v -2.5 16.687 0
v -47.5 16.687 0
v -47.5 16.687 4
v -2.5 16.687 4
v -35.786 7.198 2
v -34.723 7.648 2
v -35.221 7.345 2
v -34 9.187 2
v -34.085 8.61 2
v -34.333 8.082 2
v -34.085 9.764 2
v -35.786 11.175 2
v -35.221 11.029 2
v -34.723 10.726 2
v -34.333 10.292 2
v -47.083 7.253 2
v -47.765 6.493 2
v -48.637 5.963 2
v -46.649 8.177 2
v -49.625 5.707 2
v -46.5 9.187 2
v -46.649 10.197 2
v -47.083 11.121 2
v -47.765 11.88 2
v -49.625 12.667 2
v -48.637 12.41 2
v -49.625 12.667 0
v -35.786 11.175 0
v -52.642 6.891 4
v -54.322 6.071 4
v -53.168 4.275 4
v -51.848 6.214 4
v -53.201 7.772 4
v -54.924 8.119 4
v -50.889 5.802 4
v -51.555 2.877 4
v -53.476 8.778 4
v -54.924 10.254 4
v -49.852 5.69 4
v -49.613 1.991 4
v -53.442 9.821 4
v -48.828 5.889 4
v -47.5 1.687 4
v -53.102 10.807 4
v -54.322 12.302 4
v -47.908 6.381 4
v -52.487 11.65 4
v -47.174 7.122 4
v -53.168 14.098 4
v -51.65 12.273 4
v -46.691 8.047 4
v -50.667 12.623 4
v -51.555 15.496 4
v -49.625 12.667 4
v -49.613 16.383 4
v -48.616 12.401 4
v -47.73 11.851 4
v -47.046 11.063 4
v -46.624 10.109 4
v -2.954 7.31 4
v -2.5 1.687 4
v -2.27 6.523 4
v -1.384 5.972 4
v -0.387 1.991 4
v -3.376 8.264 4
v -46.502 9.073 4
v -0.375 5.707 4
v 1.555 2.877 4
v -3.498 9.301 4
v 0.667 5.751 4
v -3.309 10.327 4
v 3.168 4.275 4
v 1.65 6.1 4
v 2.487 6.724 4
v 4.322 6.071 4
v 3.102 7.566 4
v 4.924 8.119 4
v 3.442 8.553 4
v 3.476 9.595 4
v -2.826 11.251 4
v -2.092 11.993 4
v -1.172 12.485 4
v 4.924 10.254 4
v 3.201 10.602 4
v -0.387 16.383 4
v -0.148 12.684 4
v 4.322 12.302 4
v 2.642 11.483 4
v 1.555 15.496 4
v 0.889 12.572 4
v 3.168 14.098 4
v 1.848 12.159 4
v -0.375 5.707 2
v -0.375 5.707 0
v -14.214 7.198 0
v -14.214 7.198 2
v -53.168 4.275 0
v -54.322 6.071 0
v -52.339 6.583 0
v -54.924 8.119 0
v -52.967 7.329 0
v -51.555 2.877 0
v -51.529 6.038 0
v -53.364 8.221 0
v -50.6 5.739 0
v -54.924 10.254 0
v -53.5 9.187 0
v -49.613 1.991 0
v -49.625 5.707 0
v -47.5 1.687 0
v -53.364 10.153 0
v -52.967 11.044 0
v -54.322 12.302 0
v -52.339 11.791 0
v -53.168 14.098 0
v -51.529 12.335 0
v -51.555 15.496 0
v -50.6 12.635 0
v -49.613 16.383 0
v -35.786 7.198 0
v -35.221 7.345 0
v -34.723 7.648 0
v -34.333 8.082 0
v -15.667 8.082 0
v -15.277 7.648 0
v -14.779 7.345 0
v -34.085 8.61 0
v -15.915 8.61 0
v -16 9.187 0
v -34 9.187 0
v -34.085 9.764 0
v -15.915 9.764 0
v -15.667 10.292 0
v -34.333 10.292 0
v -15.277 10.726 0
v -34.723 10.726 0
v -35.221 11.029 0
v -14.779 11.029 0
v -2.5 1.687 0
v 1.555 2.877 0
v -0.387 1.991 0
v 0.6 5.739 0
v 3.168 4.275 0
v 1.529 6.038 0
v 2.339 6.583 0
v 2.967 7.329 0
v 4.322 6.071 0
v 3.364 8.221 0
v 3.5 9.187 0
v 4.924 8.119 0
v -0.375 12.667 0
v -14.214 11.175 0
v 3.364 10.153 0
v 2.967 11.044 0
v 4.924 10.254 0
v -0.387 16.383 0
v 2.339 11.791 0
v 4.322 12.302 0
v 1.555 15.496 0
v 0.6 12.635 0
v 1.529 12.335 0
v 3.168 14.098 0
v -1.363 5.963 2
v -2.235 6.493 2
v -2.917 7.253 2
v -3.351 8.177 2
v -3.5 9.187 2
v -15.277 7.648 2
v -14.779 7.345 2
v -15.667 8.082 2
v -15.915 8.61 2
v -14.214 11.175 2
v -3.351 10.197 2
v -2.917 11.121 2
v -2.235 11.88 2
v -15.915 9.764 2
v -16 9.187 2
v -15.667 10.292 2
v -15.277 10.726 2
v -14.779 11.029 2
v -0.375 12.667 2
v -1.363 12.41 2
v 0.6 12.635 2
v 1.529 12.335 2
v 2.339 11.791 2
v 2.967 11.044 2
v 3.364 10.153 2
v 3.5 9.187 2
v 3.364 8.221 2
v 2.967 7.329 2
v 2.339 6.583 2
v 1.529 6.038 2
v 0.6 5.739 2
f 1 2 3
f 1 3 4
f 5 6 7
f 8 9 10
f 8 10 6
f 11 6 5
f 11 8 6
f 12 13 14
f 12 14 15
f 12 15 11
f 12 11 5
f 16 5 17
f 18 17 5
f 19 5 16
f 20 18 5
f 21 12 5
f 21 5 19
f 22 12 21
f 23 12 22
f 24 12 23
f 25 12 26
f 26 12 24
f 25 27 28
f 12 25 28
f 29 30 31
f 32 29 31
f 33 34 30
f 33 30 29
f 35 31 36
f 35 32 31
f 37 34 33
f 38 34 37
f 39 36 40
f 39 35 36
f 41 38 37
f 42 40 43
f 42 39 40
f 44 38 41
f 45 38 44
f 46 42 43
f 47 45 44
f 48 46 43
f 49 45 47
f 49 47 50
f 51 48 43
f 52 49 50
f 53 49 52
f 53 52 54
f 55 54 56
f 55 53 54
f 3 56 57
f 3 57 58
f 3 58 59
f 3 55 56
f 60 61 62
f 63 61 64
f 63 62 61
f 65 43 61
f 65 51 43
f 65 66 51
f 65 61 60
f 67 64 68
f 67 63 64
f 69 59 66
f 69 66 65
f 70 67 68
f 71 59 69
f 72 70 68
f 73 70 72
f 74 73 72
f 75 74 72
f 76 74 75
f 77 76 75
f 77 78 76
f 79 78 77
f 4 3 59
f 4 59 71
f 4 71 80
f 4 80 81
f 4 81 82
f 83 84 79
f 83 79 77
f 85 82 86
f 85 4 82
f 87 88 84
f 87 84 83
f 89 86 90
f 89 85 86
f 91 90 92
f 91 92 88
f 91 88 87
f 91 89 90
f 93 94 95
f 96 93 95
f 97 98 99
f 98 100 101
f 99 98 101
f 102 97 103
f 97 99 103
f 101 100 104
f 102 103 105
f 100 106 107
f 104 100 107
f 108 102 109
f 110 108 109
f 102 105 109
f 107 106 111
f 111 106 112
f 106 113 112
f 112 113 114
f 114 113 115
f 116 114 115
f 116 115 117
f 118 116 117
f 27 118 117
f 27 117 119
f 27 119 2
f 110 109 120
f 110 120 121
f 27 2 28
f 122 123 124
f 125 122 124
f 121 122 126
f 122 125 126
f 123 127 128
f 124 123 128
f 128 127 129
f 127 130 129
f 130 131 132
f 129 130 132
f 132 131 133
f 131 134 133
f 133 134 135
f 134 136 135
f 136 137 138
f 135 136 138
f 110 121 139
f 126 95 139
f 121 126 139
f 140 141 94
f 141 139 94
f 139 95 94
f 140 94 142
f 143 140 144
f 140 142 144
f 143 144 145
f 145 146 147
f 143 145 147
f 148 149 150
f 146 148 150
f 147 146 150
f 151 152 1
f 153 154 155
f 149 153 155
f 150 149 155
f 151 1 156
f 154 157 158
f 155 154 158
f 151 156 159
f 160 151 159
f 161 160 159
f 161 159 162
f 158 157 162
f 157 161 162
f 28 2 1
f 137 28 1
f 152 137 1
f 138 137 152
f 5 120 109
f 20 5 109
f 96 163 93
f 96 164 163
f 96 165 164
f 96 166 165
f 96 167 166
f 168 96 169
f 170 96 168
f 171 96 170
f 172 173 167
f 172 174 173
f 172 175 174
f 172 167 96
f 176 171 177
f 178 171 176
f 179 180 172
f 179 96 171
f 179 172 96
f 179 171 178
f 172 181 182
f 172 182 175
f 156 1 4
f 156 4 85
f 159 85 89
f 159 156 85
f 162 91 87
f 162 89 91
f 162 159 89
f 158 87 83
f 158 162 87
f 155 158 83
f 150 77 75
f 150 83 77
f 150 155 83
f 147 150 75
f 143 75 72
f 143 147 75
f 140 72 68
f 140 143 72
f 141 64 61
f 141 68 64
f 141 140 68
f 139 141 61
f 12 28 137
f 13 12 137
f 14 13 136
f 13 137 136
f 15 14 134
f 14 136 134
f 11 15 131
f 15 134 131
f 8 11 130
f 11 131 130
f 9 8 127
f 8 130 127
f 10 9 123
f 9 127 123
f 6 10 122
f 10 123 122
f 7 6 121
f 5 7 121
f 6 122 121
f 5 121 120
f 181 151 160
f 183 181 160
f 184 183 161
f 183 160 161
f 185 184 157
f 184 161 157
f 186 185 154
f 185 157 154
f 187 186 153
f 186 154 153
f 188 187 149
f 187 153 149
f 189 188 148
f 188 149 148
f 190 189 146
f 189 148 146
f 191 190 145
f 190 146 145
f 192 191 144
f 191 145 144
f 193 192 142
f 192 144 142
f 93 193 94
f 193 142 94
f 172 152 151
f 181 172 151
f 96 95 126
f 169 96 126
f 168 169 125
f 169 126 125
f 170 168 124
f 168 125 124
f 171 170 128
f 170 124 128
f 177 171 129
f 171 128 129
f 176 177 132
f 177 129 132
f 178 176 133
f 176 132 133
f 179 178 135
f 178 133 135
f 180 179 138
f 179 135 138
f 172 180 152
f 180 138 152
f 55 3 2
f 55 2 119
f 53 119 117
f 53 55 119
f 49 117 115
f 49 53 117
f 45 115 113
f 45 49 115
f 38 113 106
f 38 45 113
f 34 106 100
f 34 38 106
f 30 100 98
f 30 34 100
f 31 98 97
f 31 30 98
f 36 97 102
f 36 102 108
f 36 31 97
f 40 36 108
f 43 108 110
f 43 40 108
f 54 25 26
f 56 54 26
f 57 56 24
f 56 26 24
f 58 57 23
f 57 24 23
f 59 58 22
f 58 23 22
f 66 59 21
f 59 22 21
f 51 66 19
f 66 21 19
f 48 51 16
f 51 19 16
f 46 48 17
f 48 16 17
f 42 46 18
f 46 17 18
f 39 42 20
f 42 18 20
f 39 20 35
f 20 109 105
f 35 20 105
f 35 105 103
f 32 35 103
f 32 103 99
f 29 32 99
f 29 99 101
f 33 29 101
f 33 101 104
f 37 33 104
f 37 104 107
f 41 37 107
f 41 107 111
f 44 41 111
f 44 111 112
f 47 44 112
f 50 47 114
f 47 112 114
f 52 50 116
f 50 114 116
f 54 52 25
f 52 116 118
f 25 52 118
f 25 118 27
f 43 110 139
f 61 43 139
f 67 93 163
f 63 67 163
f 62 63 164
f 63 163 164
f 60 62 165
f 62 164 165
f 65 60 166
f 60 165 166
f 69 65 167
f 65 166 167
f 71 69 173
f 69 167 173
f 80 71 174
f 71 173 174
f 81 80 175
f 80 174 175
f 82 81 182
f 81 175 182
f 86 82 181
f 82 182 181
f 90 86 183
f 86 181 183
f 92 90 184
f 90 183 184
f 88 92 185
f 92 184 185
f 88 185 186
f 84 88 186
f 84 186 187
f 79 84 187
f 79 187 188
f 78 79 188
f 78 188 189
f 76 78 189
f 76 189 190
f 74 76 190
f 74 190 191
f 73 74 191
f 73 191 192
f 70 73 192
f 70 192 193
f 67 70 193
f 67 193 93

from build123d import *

# Parameters (mm, degrees)
SKETCH1_W           = 60
SKETCH1_H           = 15
SKETCH1_R           = 1
BOSS_EXTRUDE1_DEPTH = 4
FILLET1_RADIUS      = 7.5
FILLET1_LENGTH      = 4
FILLET2_RADIUS      = 7.5
FILLET2_LENGTH      = 4
CUT_EXTRUDE1_DEPTH  = 2
SKETCH4_R           = 3.5
CUT_EXTRUDE2_DEPTH  = 6
CUT_EXTRUDE3_DEPTH  = 2
SKETCH6_R           = 3.5
CUT_EXTRUDE4_DEPTH  = 6


with BuildPart() as part:
    # Sketch1 → Boss-Extrude1 (new body)
    with BuildSketch(Plane.XY):
        with Locations((-25, 9.186746988)):
            Rectangle(SKETCH1_W, SKETCH1_H)
        with Locations((-50, 9.186746988)):
            Circle(SKETCH1_R, mode=Mode.SUBTRACT)
        with Locations((0, 9.186746988)):
            Circle(SKETCH1_R, mode=Mode.SUBTRACT)
    extrude(amount=BOSS_EXTRUDE1_DEPTH)

    # Fillet1: full round fillet: the end face becomes a half cylinder, R = half its width
    fillet1_face = Plane((5, 9.186746988, 2), x_dir=(0, 0, -1), z_dir=(1, 0, 0))  # on the end face: x along it, z out of the body
    fillet1_slab = fillet1_face.offset(-FILLET1_RADIUS / 2) * Box(FILLET1_LENGTH, 2 * FILLET1_RADIUS, FILLET1_RADIUS, mode=Mode.PRIVATE)  # the body's end, R deep
    fillet1_round = Plane((-2.5, 9.186746988, 2), x_dir=(1, 0, 0), z_dir=(0, 0, -1)) * Cylinder(FILLET1_RADIUS, FILLET1_LENGTH, mode=Mode.PRIVATE)  # its axis R under the face
    add(fillet1_slab - fillet1_round, mode=Mode.SUBTRACT)

    # Fillet2: full round fillet: the end face becomes a half cylinder, R = half its width
    fillet2_face = Plane((-55, 9.186746988, 2), x_dir=(0, 0, 1), z_dir=(-1, 0, 0))  # on the end face: x along it, z out of the body
    fillet2_slab = fillet2_face.offset(-FILLET2_RADIUS / 2) * Box(FILLET2_LENGTH, 2 * FILLET2_RADIUS, FILLET2_RADIUS, mode=Mode.PRIVATE)  # the body's end, R deep
    fillet2_round = Plane((-47.5, 9.186746988, 2), x_dir=(-1, 0, 0), z_dir=(0, 0, 1)) * Cylinder(FILLET2_RADIUS, FILLET2_LENGTH, mode=Mode.PRIVATE)  # its axis R under the face
    add(fillet2_slab - fillet2_round, mode=Mode.SUBTRACT)

    # Sketch3 → Cut-Extrude1 (cut)
    with BuildSketch(Plane(origin=(0, 0, 0), x_dir=(-1, 0, 0), z_dir=(0, 0, -1))):
        with BuildLine():
            Line((14.214285714, 11.17523426), (0.375, 12.666599715))
            ThreePointArc((0.375, 12.666599715), (-3.5, 9.186746988), (0.375, 5.706894261))
            Line((0.375, 5.706894261), (14.214285714, 7.198259716))
            ThreePointArc((14.214285714, 7.198259716), (16, 9.186746988), (14.214285714, 11.17523426))
        make_face()
    extrude(amount=-CUT_EXTRUDE1_DEPTH, mode=Mode.SUBTRACT)

    # Sketch4 → Cut-Extrude2 (cut)
    with BuildSketch(Plane(origin=(0, 0, 2), x_dir=(-1, 0, 0), z_dir=(0, 0, -1))):
        with Locations(Location((0, 9.186746988, 0), (0, 0, 276.150639828))):
            Circle(SKETCH4_R)
    extrude(amount=-CUT_EXTRUDE2_DEPTH, mode=Mode.SUBTRACT)

    # Sketch5 → Cut-Extrude3 (cut)
    with BuildSketch(Plane(origin=(0, 0, 0), x_dir=(-1, 0, 0), z_dir=(0, 0, -1))):
        with BuildLine():
            Line((49.625, 12.666599715), (35.785714286, 11.17523426))
            ThreePointArc((35.785714286, 11.17523426), (34, 9.186746988), (35.785714286, 7.198259716))
            Line((35.785714286, 7.198259716), (49.625, 5.706894261))
            ThreePointArc((49.625, 5.706894261), (53.5, 9.186746988), (49.625, 12.666599715))
        make_face()
    extrude(amount=-CUT_EXTRUDE3_DEPTH, mode=Mode.SUBTRACT)

    # Sketch6 → Cut-Extrude4 (cut)
    with BuildSketch(Plane(origin=(0, 0, 0), x_dir=(-1, 0, 0), z_dir=(0, 0, -1))):
        with Locations(Location((50, 9.186746988, 0), (0, 0, 96.150639828))):
            Circle(SKETCH6_R)
    extrude(amount=-CUT_EXTRUDE4_DEPTH, mode=Mode.SUBTRACT)


solid = part.part
